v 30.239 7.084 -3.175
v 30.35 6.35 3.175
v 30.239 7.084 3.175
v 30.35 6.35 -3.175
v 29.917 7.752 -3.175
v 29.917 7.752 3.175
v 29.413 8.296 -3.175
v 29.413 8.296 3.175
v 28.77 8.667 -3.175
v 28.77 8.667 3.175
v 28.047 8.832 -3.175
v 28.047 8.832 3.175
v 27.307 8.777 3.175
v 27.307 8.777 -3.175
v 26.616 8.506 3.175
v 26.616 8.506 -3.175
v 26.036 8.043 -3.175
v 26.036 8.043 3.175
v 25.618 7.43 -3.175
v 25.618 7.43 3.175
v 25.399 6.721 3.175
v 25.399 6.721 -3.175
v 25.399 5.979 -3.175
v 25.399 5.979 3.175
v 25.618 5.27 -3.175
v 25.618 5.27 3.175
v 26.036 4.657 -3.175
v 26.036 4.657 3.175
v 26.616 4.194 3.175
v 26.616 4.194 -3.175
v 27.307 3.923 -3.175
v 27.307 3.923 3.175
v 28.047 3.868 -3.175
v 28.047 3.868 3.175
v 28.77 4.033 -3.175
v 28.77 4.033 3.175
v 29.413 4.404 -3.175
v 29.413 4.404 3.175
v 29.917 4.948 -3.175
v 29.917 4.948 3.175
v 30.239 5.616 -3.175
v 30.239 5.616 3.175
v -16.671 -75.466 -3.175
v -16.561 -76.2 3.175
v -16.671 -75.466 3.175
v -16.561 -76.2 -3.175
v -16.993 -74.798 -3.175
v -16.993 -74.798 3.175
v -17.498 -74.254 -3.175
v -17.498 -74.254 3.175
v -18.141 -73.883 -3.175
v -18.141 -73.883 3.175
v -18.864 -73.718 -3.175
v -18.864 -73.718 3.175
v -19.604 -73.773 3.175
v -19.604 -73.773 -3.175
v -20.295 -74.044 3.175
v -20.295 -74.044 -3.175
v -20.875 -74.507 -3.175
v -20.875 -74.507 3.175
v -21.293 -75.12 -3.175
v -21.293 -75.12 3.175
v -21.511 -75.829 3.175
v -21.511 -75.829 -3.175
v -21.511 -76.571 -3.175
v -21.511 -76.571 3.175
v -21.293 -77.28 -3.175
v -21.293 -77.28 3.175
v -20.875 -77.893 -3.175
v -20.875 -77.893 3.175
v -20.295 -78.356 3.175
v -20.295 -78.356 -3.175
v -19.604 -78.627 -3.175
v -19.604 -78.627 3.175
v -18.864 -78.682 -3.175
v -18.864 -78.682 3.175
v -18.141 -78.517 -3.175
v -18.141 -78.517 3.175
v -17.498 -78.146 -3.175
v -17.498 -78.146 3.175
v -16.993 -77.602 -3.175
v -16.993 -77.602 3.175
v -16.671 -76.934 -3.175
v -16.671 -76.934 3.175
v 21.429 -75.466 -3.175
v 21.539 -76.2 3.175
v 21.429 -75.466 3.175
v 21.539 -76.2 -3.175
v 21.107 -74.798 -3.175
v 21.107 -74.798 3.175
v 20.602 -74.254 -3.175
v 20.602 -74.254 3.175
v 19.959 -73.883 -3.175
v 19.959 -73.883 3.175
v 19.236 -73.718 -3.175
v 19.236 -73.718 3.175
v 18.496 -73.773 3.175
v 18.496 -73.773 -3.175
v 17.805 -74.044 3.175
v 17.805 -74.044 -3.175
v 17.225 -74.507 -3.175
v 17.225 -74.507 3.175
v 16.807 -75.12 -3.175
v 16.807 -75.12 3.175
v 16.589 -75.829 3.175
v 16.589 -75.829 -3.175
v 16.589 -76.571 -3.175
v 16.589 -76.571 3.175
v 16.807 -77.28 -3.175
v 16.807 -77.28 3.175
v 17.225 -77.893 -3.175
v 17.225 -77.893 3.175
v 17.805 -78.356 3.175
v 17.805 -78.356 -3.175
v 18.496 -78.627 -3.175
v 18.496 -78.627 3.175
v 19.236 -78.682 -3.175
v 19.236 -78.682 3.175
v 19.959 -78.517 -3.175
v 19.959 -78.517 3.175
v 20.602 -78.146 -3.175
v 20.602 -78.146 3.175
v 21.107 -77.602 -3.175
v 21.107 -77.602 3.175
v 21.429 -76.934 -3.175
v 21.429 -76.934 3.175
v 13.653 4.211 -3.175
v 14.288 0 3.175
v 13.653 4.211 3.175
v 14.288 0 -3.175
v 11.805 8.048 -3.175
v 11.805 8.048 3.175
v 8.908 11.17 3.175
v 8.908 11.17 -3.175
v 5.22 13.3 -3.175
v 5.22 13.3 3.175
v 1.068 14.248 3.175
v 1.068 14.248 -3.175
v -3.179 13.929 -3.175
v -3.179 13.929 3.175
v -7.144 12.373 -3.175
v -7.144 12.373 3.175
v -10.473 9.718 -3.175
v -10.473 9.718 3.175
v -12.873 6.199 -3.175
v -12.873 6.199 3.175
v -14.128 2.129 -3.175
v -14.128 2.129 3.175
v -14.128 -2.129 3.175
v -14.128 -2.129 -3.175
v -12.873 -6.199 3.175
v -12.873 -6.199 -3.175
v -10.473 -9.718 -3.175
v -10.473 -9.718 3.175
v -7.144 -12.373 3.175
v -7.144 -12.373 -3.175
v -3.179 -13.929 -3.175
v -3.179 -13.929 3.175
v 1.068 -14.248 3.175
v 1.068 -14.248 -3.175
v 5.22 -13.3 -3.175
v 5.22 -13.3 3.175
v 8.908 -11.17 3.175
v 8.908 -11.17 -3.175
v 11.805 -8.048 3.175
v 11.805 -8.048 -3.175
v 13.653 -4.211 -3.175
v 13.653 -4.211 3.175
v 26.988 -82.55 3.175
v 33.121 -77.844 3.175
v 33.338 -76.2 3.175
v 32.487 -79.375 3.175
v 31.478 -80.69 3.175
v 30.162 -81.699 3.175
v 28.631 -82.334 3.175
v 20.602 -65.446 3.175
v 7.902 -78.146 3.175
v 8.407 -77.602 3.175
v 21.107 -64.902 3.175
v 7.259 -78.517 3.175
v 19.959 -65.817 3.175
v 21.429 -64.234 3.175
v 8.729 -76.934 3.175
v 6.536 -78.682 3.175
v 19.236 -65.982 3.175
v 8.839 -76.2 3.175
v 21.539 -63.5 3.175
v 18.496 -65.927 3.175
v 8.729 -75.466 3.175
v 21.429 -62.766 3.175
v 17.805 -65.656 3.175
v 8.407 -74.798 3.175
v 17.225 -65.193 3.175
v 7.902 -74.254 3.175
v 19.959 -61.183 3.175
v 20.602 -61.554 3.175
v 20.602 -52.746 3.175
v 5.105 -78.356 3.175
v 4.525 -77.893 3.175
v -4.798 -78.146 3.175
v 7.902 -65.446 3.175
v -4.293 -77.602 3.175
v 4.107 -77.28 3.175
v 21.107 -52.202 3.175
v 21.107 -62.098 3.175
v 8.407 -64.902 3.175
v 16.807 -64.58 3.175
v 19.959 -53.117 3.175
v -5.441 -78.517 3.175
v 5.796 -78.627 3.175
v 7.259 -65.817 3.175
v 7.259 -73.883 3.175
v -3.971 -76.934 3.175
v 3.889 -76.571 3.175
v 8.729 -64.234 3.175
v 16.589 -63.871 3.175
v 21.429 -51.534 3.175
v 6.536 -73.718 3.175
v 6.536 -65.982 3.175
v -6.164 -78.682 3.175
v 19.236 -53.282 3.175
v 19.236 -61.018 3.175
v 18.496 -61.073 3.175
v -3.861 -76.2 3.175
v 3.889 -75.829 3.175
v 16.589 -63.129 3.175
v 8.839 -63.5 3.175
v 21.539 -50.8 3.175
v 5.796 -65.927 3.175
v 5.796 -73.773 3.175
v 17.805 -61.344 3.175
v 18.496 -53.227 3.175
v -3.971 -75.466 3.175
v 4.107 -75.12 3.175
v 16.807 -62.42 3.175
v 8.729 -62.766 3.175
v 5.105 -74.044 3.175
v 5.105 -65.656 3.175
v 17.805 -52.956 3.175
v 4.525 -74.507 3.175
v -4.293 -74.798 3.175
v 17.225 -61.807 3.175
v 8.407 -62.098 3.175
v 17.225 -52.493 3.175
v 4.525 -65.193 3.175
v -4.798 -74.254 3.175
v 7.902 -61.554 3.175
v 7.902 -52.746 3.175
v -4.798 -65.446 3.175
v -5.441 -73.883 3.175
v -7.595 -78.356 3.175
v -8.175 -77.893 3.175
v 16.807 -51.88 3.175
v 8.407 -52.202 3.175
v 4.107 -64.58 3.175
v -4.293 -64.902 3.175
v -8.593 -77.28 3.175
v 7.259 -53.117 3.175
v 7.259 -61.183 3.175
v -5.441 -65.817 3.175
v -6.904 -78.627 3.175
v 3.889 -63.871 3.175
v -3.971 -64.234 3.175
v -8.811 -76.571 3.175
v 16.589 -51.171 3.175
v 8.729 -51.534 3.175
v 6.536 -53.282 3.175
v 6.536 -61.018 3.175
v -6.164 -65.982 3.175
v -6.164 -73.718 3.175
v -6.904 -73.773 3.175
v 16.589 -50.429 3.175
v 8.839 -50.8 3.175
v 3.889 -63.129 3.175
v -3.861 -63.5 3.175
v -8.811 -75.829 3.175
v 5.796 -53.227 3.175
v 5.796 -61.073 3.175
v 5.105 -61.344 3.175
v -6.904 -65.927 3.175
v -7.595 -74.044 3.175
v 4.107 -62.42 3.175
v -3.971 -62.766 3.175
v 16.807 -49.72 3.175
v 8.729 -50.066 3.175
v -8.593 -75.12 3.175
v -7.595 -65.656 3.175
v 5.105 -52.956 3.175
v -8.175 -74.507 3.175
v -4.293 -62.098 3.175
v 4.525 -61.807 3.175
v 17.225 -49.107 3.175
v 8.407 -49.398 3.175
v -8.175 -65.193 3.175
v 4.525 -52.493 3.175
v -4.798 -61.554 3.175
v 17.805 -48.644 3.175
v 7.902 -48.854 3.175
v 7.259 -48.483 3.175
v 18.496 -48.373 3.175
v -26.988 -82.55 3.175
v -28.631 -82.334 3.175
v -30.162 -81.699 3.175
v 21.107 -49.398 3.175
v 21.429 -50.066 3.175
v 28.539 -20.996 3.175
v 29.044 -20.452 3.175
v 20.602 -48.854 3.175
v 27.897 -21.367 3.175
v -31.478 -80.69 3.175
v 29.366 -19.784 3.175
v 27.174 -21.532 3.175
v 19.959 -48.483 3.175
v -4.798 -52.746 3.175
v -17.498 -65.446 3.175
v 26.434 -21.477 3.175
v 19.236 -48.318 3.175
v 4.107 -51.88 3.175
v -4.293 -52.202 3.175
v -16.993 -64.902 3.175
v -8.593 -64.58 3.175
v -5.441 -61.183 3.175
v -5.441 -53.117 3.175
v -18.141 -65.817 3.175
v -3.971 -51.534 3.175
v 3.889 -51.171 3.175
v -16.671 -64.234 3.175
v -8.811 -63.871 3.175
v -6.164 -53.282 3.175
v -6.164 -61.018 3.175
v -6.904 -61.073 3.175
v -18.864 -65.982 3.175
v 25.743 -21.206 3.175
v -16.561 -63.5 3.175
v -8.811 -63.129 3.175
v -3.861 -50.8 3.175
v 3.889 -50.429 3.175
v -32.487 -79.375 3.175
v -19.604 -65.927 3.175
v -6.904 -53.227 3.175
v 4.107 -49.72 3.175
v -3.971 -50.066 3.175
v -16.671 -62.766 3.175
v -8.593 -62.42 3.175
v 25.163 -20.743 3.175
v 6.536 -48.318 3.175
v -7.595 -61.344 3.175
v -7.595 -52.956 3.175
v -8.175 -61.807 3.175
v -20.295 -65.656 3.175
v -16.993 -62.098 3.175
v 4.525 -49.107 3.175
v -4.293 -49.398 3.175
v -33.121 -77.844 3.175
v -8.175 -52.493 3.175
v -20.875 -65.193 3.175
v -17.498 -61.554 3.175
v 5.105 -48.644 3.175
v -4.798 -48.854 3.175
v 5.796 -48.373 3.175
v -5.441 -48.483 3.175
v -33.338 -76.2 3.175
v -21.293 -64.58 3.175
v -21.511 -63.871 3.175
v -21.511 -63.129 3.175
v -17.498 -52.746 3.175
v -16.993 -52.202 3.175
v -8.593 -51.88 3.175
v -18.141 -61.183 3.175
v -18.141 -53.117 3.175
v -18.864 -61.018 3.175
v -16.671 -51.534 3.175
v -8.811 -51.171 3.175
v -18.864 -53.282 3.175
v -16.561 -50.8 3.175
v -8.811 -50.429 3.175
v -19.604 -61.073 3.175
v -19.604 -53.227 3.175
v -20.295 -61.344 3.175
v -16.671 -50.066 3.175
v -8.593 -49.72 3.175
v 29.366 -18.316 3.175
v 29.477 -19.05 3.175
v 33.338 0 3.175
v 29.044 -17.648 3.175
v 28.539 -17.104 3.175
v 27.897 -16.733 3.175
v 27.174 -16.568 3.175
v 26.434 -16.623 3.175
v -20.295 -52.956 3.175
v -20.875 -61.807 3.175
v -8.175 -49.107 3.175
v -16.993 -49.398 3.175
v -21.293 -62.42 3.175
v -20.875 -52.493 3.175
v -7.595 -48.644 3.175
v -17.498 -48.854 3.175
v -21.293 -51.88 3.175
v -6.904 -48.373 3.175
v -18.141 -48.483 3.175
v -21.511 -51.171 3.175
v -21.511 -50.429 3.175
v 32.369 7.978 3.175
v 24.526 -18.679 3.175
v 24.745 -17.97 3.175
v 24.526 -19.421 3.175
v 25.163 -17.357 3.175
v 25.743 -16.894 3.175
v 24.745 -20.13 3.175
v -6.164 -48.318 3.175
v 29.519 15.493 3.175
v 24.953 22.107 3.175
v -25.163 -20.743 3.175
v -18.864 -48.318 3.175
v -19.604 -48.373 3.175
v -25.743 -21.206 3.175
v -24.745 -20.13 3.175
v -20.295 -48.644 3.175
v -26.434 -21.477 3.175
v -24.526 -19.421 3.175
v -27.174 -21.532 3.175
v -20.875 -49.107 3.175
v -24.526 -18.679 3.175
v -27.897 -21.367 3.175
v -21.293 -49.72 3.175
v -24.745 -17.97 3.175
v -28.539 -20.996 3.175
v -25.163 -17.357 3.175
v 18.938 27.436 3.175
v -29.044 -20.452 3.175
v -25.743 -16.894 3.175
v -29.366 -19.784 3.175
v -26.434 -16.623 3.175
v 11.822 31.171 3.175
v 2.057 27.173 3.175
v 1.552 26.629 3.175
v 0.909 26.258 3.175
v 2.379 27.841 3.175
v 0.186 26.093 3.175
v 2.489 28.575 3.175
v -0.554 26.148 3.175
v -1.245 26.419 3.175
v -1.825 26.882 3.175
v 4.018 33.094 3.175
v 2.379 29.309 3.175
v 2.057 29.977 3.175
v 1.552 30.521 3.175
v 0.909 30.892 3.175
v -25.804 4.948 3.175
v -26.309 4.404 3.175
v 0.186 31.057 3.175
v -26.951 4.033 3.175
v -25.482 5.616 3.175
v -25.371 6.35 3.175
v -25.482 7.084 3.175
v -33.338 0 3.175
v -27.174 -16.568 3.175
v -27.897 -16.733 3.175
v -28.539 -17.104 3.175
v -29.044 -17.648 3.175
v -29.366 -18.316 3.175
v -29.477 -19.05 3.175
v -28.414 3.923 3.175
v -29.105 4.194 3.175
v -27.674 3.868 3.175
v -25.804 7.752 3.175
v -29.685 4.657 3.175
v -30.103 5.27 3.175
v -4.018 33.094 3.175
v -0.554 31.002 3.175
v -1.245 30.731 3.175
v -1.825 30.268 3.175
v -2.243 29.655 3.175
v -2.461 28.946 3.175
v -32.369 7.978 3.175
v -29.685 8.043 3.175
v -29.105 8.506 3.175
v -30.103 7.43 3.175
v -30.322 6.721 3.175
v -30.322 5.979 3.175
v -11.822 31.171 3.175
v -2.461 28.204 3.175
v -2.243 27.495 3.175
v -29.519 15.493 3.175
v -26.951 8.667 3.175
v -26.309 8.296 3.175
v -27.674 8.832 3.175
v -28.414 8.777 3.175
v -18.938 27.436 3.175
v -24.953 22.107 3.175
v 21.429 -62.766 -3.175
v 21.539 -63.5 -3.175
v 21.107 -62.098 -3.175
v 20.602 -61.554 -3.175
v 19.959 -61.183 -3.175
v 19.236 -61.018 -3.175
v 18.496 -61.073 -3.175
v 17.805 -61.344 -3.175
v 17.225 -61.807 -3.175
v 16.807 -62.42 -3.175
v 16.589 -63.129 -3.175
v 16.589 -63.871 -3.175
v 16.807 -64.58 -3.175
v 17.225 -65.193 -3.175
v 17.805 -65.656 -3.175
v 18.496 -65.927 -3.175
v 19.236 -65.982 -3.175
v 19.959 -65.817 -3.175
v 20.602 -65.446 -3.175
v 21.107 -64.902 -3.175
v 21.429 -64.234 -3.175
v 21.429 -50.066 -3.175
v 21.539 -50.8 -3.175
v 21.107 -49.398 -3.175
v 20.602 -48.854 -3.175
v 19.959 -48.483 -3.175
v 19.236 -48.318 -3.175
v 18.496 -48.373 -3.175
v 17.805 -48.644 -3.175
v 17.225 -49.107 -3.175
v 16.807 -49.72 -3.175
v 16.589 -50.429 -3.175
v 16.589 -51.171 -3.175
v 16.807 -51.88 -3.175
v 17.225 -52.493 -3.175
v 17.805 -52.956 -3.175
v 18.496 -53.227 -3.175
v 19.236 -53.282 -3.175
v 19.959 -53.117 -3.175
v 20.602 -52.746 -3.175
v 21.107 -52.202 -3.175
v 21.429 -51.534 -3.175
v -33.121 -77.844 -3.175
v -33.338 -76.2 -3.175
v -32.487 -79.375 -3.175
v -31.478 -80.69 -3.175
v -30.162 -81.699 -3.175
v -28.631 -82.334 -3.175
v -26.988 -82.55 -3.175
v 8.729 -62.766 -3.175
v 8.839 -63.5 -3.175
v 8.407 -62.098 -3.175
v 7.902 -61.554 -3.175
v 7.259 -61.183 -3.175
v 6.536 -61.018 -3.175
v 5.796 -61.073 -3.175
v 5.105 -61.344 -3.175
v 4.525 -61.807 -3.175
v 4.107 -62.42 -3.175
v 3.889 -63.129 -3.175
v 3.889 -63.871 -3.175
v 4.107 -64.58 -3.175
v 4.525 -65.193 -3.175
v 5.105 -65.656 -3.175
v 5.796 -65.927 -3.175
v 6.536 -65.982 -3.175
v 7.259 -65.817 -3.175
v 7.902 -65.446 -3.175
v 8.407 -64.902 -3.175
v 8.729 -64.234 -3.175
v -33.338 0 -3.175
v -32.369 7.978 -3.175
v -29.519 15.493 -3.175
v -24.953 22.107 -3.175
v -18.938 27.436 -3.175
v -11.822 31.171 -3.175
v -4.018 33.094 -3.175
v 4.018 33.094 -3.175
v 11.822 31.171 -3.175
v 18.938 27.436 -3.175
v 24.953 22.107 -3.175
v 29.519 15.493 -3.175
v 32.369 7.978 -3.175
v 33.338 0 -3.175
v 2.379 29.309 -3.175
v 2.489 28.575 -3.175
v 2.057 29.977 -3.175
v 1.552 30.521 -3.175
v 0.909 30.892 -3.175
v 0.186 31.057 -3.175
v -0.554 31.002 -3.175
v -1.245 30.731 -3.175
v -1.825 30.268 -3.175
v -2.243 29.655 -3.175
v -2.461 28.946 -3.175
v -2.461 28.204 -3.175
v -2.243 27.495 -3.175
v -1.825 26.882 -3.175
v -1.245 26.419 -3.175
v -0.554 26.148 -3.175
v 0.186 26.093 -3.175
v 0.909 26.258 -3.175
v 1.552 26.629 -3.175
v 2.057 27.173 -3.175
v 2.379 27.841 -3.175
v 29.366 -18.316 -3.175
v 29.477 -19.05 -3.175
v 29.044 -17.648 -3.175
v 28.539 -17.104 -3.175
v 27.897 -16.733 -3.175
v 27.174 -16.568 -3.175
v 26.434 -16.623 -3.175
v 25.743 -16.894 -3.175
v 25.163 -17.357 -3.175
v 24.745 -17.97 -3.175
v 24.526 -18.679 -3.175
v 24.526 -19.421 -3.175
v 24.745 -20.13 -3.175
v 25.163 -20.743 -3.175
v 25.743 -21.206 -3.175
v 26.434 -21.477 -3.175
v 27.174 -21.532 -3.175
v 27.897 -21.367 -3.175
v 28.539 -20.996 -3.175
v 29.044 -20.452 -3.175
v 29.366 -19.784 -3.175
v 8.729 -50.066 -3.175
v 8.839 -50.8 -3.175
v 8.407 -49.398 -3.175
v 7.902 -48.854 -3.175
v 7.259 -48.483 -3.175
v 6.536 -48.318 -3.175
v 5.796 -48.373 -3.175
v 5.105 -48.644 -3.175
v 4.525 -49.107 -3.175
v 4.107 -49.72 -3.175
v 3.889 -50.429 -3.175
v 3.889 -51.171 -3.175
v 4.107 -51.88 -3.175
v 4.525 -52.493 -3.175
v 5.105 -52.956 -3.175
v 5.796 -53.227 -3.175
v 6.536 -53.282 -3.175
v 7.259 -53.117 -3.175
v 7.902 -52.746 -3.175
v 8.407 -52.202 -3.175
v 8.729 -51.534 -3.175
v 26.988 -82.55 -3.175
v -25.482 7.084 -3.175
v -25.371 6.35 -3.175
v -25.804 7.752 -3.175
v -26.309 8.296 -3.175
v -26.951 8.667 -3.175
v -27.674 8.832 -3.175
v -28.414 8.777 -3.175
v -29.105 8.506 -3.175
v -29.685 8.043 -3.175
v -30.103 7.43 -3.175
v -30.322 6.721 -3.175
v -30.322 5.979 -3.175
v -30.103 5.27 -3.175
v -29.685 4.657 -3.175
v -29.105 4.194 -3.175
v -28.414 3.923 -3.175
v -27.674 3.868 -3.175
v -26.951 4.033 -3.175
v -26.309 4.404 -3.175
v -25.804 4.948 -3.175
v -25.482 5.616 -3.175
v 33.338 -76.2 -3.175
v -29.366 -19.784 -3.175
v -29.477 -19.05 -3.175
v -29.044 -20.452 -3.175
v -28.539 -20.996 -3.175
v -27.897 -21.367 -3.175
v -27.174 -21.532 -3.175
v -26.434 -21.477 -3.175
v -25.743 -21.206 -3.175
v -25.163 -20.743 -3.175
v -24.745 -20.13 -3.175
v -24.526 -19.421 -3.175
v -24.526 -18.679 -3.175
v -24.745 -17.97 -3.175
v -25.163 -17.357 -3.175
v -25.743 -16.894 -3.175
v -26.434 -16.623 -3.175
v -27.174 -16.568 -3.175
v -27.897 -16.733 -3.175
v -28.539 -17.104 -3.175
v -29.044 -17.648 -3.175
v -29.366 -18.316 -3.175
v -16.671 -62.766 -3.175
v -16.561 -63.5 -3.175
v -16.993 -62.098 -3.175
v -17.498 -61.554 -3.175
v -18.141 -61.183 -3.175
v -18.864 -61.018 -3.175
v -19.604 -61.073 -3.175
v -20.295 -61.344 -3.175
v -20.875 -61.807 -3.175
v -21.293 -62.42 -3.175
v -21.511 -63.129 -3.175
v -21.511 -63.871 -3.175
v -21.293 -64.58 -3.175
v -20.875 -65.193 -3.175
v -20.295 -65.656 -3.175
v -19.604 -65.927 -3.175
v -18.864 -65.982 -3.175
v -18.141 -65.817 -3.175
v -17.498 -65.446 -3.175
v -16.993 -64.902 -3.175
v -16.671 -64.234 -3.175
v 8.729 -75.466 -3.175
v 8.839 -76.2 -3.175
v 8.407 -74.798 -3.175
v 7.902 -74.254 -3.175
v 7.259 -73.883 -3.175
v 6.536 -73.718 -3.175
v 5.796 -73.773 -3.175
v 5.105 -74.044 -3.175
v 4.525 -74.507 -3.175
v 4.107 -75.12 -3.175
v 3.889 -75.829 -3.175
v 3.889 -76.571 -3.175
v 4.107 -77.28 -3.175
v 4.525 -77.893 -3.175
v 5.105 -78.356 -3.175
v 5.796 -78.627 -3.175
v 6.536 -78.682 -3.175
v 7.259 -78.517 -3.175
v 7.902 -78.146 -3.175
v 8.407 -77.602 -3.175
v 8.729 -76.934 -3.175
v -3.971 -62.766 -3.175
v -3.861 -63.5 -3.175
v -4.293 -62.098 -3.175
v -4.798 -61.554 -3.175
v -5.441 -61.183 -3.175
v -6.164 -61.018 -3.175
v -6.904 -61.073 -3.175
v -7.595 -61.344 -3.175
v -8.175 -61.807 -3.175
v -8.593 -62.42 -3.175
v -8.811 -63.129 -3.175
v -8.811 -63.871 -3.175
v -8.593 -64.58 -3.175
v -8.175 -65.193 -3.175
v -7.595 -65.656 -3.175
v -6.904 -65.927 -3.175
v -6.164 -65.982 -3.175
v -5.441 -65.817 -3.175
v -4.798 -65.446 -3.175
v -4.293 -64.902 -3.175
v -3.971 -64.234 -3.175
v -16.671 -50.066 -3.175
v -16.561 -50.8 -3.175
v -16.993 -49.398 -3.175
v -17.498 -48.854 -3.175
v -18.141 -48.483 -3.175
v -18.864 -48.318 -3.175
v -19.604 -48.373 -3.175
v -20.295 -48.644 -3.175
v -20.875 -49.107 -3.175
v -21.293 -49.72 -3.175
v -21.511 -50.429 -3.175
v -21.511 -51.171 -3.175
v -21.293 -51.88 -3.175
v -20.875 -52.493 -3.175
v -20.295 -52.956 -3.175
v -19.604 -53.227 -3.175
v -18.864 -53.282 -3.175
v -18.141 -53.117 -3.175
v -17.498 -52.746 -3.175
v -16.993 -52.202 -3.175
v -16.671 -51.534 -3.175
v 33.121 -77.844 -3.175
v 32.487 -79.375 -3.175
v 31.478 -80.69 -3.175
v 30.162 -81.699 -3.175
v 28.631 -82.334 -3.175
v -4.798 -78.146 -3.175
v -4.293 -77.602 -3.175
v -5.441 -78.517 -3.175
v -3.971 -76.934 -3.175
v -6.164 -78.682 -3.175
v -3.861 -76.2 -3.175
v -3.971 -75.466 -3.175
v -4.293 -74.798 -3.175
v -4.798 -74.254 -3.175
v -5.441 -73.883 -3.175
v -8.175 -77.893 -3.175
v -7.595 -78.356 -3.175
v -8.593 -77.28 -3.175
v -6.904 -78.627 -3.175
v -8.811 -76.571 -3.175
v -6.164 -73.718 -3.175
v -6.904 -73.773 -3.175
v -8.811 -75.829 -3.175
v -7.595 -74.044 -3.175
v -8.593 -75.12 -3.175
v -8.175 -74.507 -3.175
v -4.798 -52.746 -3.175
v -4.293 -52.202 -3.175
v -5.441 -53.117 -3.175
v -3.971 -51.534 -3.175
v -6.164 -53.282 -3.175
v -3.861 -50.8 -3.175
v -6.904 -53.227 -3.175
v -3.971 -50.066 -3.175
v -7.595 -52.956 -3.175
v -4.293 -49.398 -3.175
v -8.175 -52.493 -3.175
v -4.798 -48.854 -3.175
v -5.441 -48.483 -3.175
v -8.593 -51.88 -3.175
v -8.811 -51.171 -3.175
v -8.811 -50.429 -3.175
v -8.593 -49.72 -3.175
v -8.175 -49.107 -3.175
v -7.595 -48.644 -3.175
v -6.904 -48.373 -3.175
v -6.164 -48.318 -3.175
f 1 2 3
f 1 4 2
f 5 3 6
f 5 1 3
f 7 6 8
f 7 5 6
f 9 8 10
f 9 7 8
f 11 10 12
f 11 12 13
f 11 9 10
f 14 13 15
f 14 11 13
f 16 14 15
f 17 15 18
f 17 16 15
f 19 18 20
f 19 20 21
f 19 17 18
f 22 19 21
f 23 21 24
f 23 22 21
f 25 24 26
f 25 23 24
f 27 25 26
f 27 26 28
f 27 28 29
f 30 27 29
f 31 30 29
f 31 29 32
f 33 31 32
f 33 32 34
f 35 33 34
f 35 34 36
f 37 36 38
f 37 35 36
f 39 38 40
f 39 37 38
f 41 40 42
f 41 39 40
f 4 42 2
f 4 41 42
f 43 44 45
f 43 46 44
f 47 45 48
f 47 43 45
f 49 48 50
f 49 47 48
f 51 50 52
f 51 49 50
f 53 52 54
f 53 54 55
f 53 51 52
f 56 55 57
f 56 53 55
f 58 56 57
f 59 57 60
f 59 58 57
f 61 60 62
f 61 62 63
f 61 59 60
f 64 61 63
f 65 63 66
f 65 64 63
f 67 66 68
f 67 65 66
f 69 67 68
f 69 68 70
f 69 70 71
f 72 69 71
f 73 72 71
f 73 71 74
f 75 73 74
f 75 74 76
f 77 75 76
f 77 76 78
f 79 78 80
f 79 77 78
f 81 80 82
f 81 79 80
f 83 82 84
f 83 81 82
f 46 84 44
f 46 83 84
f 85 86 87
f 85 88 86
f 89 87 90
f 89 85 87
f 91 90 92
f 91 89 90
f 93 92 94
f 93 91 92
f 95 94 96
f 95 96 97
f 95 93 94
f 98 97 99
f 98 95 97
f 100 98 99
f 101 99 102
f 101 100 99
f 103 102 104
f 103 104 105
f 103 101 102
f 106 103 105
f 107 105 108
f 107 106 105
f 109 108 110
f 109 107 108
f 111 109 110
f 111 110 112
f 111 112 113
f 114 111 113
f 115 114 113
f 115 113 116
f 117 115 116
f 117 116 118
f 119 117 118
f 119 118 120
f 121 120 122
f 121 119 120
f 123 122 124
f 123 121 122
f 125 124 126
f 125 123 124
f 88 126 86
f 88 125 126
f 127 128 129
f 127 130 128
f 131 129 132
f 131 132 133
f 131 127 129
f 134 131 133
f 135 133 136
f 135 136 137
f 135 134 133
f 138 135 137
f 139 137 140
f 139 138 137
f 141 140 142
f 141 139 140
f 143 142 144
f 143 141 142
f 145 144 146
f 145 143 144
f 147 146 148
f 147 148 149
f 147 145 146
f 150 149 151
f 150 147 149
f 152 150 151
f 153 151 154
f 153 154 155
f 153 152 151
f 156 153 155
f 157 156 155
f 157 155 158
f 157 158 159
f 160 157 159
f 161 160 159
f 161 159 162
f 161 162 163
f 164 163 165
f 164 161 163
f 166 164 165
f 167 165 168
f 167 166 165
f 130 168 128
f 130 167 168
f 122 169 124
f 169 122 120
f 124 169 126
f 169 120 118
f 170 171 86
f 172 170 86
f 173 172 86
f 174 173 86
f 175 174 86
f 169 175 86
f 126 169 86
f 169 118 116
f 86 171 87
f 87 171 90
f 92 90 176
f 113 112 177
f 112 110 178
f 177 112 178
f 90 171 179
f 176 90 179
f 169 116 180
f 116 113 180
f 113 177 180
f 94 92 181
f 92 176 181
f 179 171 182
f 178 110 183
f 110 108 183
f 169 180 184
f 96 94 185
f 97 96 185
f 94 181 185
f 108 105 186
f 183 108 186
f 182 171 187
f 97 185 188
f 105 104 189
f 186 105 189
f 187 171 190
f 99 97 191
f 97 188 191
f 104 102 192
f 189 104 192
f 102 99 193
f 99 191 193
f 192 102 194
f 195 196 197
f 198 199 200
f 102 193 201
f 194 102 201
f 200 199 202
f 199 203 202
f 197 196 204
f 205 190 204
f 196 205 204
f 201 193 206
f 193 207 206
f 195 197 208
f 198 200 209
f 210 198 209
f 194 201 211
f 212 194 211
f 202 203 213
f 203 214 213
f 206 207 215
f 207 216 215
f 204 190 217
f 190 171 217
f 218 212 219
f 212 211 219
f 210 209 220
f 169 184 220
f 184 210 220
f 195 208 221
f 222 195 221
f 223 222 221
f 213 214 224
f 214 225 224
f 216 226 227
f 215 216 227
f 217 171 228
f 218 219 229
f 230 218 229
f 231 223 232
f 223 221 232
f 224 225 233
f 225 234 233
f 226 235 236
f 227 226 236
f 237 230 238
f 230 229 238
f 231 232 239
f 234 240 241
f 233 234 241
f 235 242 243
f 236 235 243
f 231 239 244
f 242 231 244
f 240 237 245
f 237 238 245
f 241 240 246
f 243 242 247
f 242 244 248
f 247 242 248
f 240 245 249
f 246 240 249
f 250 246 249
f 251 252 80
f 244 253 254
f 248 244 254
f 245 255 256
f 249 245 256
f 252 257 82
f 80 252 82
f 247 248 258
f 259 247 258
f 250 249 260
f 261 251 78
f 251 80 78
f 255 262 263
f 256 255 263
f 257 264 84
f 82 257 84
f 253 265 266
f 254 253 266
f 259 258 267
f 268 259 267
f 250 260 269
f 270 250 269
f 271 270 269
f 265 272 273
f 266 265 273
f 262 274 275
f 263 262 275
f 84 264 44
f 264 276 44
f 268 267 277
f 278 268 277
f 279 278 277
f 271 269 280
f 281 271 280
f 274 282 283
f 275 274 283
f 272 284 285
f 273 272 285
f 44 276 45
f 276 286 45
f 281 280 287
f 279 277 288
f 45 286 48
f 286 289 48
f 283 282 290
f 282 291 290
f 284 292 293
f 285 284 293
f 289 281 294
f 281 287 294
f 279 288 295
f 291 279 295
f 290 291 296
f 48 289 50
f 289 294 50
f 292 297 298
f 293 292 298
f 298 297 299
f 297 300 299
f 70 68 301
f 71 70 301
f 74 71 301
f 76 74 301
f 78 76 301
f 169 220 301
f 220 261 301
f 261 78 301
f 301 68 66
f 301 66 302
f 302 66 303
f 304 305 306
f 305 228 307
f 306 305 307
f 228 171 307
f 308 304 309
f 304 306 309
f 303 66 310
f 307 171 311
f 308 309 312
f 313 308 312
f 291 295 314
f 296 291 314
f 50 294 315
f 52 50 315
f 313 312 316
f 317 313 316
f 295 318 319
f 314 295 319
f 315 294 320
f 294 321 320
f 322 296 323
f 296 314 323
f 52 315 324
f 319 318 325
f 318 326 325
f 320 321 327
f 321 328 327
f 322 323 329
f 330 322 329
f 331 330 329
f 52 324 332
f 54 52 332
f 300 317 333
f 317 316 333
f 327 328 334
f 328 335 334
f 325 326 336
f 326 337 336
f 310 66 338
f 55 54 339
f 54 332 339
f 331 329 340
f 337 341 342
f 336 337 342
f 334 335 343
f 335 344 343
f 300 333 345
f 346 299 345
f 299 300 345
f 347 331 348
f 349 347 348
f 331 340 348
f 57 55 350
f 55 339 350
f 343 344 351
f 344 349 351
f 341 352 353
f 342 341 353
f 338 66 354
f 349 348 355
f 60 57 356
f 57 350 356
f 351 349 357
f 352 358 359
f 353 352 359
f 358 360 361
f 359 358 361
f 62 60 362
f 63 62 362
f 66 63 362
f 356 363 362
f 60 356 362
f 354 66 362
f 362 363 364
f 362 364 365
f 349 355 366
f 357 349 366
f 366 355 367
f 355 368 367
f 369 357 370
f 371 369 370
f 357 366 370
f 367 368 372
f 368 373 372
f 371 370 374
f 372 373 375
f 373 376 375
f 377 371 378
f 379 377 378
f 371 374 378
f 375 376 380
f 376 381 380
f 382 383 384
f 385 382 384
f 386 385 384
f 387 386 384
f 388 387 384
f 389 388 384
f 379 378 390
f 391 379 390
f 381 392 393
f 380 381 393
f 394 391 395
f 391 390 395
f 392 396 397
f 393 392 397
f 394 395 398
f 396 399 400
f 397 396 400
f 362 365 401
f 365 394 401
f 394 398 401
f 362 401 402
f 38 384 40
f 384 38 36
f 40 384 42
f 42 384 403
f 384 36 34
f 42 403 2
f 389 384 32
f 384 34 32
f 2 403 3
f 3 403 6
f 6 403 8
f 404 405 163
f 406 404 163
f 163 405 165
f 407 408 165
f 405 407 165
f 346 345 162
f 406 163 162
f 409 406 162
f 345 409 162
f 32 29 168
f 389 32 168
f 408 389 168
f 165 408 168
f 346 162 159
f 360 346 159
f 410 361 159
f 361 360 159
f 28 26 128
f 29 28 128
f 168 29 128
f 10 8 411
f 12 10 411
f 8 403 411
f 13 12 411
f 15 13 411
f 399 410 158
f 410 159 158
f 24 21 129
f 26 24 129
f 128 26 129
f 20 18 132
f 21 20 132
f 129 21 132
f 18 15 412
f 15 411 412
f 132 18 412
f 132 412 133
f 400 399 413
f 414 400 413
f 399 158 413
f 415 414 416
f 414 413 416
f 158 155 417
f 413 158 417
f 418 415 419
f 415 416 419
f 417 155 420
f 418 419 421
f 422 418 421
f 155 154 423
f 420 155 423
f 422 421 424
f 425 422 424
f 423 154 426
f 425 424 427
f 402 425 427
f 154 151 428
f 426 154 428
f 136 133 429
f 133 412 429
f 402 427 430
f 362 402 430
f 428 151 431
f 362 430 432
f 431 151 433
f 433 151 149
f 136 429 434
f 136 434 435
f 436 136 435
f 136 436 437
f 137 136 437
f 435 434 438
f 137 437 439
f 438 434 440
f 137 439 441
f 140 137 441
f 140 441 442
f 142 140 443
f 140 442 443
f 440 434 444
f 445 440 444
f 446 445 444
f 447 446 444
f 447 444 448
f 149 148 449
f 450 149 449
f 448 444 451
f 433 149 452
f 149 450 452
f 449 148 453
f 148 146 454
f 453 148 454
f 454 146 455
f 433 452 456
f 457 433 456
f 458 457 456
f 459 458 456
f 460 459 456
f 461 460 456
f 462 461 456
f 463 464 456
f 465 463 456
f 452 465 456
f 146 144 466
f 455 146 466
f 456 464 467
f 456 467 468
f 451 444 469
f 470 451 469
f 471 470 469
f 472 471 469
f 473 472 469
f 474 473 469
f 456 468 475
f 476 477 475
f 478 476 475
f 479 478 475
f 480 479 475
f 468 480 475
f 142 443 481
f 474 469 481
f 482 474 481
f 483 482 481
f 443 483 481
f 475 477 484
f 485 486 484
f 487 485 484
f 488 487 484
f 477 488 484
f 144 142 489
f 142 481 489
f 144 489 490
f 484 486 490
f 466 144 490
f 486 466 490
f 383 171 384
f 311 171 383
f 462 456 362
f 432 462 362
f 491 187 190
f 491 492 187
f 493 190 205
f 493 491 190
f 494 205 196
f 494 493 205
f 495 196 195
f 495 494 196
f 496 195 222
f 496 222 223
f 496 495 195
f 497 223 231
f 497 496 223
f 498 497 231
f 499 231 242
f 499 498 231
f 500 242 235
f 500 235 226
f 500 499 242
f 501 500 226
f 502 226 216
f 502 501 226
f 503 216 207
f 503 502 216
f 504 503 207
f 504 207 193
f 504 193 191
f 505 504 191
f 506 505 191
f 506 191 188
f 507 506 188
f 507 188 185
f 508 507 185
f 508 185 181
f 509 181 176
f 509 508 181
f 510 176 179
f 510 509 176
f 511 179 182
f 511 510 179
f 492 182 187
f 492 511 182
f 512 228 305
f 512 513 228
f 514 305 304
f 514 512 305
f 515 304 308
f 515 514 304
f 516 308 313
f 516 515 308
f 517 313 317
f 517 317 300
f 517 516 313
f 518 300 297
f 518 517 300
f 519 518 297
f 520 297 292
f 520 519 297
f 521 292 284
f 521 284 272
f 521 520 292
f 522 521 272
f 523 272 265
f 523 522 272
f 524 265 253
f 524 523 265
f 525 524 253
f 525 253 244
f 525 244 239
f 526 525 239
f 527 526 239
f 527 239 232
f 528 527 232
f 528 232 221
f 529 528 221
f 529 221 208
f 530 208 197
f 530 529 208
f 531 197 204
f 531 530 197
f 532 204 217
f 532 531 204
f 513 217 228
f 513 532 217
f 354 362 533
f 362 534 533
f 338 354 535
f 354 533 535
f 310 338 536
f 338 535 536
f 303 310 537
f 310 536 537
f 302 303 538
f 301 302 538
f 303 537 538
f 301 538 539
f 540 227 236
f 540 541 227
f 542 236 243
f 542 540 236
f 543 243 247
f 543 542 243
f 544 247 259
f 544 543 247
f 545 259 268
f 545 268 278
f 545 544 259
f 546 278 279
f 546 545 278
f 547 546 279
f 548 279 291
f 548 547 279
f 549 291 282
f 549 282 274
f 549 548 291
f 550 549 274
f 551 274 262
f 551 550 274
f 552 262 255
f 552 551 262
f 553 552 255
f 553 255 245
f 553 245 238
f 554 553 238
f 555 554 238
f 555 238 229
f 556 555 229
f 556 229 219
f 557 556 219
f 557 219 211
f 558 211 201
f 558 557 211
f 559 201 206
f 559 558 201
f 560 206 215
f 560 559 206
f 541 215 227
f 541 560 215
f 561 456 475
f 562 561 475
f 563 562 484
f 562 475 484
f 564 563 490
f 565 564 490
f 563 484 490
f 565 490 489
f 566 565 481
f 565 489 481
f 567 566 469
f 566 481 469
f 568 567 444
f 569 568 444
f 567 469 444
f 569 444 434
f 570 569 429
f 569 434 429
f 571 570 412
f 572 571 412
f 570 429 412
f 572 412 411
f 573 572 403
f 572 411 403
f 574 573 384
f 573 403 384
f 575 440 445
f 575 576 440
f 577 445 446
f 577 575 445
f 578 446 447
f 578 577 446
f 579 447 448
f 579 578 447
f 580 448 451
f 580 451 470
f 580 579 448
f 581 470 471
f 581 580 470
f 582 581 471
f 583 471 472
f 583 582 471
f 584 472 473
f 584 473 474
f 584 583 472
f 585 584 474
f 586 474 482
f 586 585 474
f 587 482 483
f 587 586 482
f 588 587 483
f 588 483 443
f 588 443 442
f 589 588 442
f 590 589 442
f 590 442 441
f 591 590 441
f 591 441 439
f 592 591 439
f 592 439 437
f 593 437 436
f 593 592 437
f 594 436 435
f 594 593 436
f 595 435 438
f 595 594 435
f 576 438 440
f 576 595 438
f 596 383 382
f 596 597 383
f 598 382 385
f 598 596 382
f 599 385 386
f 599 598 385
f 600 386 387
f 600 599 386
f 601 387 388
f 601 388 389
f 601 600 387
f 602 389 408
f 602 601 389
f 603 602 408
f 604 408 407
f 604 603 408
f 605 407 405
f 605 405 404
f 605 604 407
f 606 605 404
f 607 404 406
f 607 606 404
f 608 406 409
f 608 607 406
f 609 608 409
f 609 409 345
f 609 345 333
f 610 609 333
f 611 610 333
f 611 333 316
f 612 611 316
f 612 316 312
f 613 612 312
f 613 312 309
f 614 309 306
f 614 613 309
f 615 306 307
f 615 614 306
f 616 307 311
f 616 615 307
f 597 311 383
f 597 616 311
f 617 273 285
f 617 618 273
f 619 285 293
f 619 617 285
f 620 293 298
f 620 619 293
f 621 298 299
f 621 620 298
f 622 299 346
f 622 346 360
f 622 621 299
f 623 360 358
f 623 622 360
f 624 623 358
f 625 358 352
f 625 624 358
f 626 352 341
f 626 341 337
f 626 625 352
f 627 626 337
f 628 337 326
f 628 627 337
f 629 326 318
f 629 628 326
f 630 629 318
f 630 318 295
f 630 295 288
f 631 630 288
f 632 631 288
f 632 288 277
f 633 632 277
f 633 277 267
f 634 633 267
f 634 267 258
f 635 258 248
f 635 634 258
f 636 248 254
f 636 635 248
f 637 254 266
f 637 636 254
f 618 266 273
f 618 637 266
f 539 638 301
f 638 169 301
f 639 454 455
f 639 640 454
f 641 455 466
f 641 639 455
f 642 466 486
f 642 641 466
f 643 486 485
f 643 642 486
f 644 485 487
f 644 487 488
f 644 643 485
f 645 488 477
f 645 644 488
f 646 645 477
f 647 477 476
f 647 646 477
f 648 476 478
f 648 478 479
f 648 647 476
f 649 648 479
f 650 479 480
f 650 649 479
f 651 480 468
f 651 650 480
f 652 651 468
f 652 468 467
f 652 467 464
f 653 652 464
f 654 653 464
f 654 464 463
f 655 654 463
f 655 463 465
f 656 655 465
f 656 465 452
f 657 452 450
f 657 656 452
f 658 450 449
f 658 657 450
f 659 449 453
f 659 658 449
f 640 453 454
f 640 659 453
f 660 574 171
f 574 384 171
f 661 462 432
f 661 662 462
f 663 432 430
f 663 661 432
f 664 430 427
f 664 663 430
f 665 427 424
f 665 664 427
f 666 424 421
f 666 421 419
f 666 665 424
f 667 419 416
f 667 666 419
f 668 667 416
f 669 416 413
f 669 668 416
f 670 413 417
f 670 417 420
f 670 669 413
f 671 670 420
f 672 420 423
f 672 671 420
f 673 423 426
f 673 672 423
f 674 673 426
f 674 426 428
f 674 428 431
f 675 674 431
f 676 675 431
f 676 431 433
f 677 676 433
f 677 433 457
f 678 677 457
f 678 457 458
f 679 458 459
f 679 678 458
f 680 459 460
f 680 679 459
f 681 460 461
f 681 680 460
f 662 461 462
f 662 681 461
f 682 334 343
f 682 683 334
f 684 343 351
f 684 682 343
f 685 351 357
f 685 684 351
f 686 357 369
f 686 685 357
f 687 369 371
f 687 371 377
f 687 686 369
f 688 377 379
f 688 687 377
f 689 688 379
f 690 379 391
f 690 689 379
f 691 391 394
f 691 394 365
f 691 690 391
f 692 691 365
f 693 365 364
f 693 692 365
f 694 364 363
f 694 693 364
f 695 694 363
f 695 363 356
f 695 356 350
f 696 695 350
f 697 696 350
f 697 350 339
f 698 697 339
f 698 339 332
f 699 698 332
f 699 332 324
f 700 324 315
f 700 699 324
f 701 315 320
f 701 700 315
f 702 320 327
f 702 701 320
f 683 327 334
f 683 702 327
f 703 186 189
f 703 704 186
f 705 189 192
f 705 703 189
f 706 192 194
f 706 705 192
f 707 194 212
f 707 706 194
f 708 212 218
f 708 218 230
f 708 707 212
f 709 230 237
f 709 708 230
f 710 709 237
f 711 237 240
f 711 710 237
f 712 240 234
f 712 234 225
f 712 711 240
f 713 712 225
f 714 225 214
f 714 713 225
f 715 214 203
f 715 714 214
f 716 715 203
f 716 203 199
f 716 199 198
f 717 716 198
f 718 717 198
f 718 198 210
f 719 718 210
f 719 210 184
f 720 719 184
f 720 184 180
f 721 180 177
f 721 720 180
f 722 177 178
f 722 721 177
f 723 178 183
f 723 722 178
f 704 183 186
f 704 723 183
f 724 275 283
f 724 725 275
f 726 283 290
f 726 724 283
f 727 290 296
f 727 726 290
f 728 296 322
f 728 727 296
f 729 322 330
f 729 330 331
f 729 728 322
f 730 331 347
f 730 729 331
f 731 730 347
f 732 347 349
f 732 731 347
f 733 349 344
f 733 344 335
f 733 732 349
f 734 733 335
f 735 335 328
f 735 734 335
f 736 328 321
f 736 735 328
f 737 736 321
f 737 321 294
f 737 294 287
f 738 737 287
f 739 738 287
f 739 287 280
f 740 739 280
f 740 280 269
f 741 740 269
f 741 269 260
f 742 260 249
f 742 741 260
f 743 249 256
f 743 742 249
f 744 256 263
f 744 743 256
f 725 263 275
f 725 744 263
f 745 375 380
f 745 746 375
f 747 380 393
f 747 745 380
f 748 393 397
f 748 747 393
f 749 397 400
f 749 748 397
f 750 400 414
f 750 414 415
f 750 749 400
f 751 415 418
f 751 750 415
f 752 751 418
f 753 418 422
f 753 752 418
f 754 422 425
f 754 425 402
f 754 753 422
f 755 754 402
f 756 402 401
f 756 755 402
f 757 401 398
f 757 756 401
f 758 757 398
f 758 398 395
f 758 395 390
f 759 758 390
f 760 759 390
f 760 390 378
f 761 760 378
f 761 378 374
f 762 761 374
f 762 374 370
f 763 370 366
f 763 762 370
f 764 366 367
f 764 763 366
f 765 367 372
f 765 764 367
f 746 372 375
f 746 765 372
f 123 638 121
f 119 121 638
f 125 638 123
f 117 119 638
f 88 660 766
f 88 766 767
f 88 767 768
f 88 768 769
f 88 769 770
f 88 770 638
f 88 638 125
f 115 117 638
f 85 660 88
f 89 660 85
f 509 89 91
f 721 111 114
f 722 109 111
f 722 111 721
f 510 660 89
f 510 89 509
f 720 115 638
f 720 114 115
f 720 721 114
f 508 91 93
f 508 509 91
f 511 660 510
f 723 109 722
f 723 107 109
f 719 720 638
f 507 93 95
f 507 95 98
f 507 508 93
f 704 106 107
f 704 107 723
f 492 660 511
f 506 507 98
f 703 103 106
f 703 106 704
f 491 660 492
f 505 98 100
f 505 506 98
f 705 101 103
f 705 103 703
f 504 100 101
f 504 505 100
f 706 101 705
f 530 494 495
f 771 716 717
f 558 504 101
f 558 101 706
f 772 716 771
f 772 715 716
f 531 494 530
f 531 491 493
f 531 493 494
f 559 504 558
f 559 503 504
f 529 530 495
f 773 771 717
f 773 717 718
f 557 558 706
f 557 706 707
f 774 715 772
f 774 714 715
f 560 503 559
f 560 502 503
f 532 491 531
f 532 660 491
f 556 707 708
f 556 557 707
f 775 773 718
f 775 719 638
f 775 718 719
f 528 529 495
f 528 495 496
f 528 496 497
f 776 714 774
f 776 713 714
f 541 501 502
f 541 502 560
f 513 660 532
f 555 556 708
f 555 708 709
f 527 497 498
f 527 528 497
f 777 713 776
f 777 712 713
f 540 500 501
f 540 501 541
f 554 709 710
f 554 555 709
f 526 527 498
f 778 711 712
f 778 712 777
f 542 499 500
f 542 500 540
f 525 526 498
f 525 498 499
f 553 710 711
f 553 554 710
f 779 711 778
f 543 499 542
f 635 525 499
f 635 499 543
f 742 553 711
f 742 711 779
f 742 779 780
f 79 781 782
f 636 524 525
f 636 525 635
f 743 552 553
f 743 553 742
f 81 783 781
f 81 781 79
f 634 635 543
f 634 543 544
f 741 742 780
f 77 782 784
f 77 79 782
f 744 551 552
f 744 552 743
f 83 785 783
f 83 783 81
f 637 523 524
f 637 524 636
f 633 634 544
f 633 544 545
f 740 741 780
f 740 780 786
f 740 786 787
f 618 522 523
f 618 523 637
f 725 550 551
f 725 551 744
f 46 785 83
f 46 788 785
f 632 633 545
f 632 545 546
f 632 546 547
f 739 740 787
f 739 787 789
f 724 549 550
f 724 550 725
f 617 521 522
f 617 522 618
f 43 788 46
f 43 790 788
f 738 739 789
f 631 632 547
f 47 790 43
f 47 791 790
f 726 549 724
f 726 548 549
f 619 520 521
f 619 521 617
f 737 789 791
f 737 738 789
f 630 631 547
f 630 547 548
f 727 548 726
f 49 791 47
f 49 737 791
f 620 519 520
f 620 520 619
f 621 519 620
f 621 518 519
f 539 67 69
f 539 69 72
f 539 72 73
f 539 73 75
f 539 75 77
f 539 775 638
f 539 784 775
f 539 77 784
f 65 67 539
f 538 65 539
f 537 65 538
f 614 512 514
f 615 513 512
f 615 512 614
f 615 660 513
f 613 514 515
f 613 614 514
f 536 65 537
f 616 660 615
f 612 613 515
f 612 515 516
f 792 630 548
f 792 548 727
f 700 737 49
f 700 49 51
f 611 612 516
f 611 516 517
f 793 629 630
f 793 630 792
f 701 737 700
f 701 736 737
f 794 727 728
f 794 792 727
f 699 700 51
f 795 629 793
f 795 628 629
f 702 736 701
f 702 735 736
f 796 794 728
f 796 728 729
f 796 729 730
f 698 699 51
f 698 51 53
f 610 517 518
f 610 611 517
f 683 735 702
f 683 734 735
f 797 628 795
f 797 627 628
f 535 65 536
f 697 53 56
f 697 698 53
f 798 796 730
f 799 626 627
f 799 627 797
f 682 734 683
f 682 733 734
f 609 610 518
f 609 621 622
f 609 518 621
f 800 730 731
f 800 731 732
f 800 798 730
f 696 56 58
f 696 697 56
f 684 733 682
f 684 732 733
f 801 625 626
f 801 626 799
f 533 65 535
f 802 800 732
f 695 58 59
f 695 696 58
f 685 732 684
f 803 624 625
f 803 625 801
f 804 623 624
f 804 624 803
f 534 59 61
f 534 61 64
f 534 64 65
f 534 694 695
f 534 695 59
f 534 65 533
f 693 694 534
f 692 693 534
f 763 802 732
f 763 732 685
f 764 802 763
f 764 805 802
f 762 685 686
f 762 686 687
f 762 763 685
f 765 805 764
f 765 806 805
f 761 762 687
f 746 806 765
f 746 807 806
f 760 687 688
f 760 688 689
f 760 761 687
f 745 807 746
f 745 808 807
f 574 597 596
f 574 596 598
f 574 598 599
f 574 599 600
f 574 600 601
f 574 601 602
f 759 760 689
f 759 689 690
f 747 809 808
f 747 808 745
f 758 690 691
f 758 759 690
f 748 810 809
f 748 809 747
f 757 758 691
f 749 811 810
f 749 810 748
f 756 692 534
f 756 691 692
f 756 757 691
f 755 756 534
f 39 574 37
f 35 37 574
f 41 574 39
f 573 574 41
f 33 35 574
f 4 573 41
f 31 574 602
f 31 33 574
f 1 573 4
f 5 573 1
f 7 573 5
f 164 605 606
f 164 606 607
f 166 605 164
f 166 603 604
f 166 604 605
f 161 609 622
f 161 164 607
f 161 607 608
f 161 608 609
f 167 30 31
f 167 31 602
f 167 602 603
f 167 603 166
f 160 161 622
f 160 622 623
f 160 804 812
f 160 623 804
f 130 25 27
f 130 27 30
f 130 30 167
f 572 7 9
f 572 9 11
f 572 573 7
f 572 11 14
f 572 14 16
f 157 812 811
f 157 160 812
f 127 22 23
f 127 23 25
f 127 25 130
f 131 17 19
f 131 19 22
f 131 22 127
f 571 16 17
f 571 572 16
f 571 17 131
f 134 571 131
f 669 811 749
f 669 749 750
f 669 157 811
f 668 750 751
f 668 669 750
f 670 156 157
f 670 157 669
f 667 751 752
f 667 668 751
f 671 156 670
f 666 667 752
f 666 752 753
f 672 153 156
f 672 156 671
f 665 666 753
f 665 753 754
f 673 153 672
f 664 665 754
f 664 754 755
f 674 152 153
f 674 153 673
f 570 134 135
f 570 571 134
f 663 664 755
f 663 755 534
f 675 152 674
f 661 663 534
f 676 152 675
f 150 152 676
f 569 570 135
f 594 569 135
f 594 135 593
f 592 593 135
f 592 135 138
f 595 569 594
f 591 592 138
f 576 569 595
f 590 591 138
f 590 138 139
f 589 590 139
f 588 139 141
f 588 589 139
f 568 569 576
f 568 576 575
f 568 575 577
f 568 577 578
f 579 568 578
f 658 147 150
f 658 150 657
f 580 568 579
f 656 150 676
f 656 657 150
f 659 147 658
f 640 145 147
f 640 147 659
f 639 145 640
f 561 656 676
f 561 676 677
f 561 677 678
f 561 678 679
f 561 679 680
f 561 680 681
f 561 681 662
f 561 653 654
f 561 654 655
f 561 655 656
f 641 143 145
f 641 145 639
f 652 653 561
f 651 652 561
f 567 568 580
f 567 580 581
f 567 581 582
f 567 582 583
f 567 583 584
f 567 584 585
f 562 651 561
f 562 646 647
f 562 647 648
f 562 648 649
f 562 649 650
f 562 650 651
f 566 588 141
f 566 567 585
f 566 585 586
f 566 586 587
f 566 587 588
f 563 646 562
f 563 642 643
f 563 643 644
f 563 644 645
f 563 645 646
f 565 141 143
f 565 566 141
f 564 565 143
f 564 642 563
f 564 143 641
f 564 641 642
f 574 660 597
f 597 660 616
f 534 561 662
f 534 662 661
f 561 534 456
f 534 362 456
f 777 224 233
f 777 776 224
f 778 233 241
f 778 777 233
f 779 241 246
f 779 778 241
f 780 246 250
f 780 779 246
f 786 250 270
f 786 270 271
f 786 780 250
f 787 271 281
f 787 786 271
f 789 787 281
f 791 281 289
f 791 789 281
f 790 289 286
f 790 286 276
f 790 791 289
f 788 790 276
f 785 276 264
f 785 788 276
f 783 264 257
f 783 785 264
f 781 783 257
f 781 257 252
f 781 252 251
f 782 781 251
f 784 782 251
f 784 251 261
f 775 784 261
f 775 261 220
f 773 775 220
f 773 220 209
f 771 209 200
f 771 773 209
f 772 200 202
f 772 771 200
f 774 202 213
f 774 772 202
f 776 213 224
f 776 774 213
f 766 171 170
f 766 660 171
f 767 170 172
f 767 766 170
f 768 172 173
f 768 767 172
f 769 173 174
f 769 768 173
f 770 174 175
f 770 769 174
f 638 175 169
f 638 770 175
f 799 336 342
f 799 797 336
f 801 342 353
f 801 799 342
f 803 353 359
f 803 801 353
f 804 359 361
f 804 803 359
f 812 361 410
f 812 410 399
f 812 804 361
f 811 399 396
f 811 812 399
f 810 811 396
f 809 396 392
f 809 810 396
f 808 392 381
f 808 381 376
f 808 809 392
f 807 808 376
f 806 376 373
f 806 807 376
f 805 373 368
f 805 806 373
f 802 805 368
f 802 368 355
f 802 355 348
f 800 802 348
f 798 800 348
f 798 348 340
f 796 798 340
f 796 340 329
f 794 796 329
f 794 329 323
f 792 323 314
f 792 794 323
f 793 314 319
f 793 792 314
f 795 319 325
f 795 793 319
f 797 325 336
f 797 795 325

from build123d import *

# Parameters (mm, degrees)
SKETCH1_R           = 14.2875
SKETCH1_R_2         = 2.4892
BOSS_EXTRUDE1_DEPTH = 3.175
FILLET1_R           = 6.35


with BuildPart() as part:
    # Sketch1 → Boss-Extrude1 (new, symmetric)
    with BuildSketch(Plane.XY):
        with BuildLine():
            Line((33.3375, 0), (33.3375, -82.55))
            Line((33.3375, -82.55), (-33.3375, -82.55))
            Line((-33.3375, -82.55), (-33.3375, 0))
            ThreePointArc((-33.3375, 0), (0, 33.3375), (33.3375, 0))
        make_face()
        Circle(SKETCH1_R, mode=Mode.SUBTRACT)
        with Locations((-19.05, -76.2)):
            Circle(SKETCH1_R_2, mode=Mode.SUBTRACT)
        with Locations((-6.35, -76.2)):
            Circle(SKETCH1_R_2, mode=Mode.SUBTRACT)
        with Locations((-6.35, -63.5)):
            Circle(SKETCH1_R_2, mode=Mode.SUBTRACT)
        with Locations((-19.05, -63.5)):
            Circle(SKETCH1_R_2, mode=Mode.SUBTRACT)
        with Locations((6.35, -76.2)):
            Circle(SKETCH1_R_2, mode=Mode.SUBTRACT)
        with Locations((6.35, -63.5)):
            Circle(SKETCH1_R_2, mode=Mode.SUBTRACT)
        with Locations((-19.05, -50.8)):
            Circle(SKETCH1_R_2, mode=Mode.SUBTRACT)
        with Locations((-6.35, -50.8)):
            Circle(SKETCH1_R_2, mode=Mode.SUBTRACT)
        with Locations((6.35, -50.8)):
            Circle(SKETCH1_R_2, mode=Mode.SUBTRACT)
        with Locations((26.9875, -19.05)):
            Circle(SKETCH1_R_2, mode=Mode.SUBTRACT)
        with Locations((19.05, -76.2)):
            Circle(SKETCH1_R_2, mode=Mode.SUBTRACT)
        with Locations((19.05, -63.5)):
            Circle(SKETCH1_R_2, mode=Mode.SUBTRACT)
        with Locations((19.05, -50.8)):
            Circle(SKETCH1_R_2, mode=Mode.SUBTRACT)
        with Locations((0, 28.575)):
            Circle(SKETCH1_R_2, mode=Mode.SUBTRACT)
        with Locations((-27.86051193, 6.35)):
            Circle(SKETCH1_R_2, mode=Mode.SUBTRACT)
        with Locations((27.86051193, 6.35)):
            Circle(SKETCH1_R_2, mode=Mode.SUBTRACT)
        with Locations(Location((-26.9875, -19.05, 0), (0, 0, 180))):
            Circle(SKETCH1_R_2, mode=Mode.SUBTRACT)
    extrude(amount=BOSS_EXTRUDE1_DEPTH, both=True)

    # Fillet1
    fillet1_edges = [part.edges().sort_by_distance(p)[0] for p in [
        (33.3375, -82.55, 0),
        (-33.3375, -82.55, 0),
    ]]
    fillet(fillet1_edges, radius=FILLET1_R)


solid = part.part
